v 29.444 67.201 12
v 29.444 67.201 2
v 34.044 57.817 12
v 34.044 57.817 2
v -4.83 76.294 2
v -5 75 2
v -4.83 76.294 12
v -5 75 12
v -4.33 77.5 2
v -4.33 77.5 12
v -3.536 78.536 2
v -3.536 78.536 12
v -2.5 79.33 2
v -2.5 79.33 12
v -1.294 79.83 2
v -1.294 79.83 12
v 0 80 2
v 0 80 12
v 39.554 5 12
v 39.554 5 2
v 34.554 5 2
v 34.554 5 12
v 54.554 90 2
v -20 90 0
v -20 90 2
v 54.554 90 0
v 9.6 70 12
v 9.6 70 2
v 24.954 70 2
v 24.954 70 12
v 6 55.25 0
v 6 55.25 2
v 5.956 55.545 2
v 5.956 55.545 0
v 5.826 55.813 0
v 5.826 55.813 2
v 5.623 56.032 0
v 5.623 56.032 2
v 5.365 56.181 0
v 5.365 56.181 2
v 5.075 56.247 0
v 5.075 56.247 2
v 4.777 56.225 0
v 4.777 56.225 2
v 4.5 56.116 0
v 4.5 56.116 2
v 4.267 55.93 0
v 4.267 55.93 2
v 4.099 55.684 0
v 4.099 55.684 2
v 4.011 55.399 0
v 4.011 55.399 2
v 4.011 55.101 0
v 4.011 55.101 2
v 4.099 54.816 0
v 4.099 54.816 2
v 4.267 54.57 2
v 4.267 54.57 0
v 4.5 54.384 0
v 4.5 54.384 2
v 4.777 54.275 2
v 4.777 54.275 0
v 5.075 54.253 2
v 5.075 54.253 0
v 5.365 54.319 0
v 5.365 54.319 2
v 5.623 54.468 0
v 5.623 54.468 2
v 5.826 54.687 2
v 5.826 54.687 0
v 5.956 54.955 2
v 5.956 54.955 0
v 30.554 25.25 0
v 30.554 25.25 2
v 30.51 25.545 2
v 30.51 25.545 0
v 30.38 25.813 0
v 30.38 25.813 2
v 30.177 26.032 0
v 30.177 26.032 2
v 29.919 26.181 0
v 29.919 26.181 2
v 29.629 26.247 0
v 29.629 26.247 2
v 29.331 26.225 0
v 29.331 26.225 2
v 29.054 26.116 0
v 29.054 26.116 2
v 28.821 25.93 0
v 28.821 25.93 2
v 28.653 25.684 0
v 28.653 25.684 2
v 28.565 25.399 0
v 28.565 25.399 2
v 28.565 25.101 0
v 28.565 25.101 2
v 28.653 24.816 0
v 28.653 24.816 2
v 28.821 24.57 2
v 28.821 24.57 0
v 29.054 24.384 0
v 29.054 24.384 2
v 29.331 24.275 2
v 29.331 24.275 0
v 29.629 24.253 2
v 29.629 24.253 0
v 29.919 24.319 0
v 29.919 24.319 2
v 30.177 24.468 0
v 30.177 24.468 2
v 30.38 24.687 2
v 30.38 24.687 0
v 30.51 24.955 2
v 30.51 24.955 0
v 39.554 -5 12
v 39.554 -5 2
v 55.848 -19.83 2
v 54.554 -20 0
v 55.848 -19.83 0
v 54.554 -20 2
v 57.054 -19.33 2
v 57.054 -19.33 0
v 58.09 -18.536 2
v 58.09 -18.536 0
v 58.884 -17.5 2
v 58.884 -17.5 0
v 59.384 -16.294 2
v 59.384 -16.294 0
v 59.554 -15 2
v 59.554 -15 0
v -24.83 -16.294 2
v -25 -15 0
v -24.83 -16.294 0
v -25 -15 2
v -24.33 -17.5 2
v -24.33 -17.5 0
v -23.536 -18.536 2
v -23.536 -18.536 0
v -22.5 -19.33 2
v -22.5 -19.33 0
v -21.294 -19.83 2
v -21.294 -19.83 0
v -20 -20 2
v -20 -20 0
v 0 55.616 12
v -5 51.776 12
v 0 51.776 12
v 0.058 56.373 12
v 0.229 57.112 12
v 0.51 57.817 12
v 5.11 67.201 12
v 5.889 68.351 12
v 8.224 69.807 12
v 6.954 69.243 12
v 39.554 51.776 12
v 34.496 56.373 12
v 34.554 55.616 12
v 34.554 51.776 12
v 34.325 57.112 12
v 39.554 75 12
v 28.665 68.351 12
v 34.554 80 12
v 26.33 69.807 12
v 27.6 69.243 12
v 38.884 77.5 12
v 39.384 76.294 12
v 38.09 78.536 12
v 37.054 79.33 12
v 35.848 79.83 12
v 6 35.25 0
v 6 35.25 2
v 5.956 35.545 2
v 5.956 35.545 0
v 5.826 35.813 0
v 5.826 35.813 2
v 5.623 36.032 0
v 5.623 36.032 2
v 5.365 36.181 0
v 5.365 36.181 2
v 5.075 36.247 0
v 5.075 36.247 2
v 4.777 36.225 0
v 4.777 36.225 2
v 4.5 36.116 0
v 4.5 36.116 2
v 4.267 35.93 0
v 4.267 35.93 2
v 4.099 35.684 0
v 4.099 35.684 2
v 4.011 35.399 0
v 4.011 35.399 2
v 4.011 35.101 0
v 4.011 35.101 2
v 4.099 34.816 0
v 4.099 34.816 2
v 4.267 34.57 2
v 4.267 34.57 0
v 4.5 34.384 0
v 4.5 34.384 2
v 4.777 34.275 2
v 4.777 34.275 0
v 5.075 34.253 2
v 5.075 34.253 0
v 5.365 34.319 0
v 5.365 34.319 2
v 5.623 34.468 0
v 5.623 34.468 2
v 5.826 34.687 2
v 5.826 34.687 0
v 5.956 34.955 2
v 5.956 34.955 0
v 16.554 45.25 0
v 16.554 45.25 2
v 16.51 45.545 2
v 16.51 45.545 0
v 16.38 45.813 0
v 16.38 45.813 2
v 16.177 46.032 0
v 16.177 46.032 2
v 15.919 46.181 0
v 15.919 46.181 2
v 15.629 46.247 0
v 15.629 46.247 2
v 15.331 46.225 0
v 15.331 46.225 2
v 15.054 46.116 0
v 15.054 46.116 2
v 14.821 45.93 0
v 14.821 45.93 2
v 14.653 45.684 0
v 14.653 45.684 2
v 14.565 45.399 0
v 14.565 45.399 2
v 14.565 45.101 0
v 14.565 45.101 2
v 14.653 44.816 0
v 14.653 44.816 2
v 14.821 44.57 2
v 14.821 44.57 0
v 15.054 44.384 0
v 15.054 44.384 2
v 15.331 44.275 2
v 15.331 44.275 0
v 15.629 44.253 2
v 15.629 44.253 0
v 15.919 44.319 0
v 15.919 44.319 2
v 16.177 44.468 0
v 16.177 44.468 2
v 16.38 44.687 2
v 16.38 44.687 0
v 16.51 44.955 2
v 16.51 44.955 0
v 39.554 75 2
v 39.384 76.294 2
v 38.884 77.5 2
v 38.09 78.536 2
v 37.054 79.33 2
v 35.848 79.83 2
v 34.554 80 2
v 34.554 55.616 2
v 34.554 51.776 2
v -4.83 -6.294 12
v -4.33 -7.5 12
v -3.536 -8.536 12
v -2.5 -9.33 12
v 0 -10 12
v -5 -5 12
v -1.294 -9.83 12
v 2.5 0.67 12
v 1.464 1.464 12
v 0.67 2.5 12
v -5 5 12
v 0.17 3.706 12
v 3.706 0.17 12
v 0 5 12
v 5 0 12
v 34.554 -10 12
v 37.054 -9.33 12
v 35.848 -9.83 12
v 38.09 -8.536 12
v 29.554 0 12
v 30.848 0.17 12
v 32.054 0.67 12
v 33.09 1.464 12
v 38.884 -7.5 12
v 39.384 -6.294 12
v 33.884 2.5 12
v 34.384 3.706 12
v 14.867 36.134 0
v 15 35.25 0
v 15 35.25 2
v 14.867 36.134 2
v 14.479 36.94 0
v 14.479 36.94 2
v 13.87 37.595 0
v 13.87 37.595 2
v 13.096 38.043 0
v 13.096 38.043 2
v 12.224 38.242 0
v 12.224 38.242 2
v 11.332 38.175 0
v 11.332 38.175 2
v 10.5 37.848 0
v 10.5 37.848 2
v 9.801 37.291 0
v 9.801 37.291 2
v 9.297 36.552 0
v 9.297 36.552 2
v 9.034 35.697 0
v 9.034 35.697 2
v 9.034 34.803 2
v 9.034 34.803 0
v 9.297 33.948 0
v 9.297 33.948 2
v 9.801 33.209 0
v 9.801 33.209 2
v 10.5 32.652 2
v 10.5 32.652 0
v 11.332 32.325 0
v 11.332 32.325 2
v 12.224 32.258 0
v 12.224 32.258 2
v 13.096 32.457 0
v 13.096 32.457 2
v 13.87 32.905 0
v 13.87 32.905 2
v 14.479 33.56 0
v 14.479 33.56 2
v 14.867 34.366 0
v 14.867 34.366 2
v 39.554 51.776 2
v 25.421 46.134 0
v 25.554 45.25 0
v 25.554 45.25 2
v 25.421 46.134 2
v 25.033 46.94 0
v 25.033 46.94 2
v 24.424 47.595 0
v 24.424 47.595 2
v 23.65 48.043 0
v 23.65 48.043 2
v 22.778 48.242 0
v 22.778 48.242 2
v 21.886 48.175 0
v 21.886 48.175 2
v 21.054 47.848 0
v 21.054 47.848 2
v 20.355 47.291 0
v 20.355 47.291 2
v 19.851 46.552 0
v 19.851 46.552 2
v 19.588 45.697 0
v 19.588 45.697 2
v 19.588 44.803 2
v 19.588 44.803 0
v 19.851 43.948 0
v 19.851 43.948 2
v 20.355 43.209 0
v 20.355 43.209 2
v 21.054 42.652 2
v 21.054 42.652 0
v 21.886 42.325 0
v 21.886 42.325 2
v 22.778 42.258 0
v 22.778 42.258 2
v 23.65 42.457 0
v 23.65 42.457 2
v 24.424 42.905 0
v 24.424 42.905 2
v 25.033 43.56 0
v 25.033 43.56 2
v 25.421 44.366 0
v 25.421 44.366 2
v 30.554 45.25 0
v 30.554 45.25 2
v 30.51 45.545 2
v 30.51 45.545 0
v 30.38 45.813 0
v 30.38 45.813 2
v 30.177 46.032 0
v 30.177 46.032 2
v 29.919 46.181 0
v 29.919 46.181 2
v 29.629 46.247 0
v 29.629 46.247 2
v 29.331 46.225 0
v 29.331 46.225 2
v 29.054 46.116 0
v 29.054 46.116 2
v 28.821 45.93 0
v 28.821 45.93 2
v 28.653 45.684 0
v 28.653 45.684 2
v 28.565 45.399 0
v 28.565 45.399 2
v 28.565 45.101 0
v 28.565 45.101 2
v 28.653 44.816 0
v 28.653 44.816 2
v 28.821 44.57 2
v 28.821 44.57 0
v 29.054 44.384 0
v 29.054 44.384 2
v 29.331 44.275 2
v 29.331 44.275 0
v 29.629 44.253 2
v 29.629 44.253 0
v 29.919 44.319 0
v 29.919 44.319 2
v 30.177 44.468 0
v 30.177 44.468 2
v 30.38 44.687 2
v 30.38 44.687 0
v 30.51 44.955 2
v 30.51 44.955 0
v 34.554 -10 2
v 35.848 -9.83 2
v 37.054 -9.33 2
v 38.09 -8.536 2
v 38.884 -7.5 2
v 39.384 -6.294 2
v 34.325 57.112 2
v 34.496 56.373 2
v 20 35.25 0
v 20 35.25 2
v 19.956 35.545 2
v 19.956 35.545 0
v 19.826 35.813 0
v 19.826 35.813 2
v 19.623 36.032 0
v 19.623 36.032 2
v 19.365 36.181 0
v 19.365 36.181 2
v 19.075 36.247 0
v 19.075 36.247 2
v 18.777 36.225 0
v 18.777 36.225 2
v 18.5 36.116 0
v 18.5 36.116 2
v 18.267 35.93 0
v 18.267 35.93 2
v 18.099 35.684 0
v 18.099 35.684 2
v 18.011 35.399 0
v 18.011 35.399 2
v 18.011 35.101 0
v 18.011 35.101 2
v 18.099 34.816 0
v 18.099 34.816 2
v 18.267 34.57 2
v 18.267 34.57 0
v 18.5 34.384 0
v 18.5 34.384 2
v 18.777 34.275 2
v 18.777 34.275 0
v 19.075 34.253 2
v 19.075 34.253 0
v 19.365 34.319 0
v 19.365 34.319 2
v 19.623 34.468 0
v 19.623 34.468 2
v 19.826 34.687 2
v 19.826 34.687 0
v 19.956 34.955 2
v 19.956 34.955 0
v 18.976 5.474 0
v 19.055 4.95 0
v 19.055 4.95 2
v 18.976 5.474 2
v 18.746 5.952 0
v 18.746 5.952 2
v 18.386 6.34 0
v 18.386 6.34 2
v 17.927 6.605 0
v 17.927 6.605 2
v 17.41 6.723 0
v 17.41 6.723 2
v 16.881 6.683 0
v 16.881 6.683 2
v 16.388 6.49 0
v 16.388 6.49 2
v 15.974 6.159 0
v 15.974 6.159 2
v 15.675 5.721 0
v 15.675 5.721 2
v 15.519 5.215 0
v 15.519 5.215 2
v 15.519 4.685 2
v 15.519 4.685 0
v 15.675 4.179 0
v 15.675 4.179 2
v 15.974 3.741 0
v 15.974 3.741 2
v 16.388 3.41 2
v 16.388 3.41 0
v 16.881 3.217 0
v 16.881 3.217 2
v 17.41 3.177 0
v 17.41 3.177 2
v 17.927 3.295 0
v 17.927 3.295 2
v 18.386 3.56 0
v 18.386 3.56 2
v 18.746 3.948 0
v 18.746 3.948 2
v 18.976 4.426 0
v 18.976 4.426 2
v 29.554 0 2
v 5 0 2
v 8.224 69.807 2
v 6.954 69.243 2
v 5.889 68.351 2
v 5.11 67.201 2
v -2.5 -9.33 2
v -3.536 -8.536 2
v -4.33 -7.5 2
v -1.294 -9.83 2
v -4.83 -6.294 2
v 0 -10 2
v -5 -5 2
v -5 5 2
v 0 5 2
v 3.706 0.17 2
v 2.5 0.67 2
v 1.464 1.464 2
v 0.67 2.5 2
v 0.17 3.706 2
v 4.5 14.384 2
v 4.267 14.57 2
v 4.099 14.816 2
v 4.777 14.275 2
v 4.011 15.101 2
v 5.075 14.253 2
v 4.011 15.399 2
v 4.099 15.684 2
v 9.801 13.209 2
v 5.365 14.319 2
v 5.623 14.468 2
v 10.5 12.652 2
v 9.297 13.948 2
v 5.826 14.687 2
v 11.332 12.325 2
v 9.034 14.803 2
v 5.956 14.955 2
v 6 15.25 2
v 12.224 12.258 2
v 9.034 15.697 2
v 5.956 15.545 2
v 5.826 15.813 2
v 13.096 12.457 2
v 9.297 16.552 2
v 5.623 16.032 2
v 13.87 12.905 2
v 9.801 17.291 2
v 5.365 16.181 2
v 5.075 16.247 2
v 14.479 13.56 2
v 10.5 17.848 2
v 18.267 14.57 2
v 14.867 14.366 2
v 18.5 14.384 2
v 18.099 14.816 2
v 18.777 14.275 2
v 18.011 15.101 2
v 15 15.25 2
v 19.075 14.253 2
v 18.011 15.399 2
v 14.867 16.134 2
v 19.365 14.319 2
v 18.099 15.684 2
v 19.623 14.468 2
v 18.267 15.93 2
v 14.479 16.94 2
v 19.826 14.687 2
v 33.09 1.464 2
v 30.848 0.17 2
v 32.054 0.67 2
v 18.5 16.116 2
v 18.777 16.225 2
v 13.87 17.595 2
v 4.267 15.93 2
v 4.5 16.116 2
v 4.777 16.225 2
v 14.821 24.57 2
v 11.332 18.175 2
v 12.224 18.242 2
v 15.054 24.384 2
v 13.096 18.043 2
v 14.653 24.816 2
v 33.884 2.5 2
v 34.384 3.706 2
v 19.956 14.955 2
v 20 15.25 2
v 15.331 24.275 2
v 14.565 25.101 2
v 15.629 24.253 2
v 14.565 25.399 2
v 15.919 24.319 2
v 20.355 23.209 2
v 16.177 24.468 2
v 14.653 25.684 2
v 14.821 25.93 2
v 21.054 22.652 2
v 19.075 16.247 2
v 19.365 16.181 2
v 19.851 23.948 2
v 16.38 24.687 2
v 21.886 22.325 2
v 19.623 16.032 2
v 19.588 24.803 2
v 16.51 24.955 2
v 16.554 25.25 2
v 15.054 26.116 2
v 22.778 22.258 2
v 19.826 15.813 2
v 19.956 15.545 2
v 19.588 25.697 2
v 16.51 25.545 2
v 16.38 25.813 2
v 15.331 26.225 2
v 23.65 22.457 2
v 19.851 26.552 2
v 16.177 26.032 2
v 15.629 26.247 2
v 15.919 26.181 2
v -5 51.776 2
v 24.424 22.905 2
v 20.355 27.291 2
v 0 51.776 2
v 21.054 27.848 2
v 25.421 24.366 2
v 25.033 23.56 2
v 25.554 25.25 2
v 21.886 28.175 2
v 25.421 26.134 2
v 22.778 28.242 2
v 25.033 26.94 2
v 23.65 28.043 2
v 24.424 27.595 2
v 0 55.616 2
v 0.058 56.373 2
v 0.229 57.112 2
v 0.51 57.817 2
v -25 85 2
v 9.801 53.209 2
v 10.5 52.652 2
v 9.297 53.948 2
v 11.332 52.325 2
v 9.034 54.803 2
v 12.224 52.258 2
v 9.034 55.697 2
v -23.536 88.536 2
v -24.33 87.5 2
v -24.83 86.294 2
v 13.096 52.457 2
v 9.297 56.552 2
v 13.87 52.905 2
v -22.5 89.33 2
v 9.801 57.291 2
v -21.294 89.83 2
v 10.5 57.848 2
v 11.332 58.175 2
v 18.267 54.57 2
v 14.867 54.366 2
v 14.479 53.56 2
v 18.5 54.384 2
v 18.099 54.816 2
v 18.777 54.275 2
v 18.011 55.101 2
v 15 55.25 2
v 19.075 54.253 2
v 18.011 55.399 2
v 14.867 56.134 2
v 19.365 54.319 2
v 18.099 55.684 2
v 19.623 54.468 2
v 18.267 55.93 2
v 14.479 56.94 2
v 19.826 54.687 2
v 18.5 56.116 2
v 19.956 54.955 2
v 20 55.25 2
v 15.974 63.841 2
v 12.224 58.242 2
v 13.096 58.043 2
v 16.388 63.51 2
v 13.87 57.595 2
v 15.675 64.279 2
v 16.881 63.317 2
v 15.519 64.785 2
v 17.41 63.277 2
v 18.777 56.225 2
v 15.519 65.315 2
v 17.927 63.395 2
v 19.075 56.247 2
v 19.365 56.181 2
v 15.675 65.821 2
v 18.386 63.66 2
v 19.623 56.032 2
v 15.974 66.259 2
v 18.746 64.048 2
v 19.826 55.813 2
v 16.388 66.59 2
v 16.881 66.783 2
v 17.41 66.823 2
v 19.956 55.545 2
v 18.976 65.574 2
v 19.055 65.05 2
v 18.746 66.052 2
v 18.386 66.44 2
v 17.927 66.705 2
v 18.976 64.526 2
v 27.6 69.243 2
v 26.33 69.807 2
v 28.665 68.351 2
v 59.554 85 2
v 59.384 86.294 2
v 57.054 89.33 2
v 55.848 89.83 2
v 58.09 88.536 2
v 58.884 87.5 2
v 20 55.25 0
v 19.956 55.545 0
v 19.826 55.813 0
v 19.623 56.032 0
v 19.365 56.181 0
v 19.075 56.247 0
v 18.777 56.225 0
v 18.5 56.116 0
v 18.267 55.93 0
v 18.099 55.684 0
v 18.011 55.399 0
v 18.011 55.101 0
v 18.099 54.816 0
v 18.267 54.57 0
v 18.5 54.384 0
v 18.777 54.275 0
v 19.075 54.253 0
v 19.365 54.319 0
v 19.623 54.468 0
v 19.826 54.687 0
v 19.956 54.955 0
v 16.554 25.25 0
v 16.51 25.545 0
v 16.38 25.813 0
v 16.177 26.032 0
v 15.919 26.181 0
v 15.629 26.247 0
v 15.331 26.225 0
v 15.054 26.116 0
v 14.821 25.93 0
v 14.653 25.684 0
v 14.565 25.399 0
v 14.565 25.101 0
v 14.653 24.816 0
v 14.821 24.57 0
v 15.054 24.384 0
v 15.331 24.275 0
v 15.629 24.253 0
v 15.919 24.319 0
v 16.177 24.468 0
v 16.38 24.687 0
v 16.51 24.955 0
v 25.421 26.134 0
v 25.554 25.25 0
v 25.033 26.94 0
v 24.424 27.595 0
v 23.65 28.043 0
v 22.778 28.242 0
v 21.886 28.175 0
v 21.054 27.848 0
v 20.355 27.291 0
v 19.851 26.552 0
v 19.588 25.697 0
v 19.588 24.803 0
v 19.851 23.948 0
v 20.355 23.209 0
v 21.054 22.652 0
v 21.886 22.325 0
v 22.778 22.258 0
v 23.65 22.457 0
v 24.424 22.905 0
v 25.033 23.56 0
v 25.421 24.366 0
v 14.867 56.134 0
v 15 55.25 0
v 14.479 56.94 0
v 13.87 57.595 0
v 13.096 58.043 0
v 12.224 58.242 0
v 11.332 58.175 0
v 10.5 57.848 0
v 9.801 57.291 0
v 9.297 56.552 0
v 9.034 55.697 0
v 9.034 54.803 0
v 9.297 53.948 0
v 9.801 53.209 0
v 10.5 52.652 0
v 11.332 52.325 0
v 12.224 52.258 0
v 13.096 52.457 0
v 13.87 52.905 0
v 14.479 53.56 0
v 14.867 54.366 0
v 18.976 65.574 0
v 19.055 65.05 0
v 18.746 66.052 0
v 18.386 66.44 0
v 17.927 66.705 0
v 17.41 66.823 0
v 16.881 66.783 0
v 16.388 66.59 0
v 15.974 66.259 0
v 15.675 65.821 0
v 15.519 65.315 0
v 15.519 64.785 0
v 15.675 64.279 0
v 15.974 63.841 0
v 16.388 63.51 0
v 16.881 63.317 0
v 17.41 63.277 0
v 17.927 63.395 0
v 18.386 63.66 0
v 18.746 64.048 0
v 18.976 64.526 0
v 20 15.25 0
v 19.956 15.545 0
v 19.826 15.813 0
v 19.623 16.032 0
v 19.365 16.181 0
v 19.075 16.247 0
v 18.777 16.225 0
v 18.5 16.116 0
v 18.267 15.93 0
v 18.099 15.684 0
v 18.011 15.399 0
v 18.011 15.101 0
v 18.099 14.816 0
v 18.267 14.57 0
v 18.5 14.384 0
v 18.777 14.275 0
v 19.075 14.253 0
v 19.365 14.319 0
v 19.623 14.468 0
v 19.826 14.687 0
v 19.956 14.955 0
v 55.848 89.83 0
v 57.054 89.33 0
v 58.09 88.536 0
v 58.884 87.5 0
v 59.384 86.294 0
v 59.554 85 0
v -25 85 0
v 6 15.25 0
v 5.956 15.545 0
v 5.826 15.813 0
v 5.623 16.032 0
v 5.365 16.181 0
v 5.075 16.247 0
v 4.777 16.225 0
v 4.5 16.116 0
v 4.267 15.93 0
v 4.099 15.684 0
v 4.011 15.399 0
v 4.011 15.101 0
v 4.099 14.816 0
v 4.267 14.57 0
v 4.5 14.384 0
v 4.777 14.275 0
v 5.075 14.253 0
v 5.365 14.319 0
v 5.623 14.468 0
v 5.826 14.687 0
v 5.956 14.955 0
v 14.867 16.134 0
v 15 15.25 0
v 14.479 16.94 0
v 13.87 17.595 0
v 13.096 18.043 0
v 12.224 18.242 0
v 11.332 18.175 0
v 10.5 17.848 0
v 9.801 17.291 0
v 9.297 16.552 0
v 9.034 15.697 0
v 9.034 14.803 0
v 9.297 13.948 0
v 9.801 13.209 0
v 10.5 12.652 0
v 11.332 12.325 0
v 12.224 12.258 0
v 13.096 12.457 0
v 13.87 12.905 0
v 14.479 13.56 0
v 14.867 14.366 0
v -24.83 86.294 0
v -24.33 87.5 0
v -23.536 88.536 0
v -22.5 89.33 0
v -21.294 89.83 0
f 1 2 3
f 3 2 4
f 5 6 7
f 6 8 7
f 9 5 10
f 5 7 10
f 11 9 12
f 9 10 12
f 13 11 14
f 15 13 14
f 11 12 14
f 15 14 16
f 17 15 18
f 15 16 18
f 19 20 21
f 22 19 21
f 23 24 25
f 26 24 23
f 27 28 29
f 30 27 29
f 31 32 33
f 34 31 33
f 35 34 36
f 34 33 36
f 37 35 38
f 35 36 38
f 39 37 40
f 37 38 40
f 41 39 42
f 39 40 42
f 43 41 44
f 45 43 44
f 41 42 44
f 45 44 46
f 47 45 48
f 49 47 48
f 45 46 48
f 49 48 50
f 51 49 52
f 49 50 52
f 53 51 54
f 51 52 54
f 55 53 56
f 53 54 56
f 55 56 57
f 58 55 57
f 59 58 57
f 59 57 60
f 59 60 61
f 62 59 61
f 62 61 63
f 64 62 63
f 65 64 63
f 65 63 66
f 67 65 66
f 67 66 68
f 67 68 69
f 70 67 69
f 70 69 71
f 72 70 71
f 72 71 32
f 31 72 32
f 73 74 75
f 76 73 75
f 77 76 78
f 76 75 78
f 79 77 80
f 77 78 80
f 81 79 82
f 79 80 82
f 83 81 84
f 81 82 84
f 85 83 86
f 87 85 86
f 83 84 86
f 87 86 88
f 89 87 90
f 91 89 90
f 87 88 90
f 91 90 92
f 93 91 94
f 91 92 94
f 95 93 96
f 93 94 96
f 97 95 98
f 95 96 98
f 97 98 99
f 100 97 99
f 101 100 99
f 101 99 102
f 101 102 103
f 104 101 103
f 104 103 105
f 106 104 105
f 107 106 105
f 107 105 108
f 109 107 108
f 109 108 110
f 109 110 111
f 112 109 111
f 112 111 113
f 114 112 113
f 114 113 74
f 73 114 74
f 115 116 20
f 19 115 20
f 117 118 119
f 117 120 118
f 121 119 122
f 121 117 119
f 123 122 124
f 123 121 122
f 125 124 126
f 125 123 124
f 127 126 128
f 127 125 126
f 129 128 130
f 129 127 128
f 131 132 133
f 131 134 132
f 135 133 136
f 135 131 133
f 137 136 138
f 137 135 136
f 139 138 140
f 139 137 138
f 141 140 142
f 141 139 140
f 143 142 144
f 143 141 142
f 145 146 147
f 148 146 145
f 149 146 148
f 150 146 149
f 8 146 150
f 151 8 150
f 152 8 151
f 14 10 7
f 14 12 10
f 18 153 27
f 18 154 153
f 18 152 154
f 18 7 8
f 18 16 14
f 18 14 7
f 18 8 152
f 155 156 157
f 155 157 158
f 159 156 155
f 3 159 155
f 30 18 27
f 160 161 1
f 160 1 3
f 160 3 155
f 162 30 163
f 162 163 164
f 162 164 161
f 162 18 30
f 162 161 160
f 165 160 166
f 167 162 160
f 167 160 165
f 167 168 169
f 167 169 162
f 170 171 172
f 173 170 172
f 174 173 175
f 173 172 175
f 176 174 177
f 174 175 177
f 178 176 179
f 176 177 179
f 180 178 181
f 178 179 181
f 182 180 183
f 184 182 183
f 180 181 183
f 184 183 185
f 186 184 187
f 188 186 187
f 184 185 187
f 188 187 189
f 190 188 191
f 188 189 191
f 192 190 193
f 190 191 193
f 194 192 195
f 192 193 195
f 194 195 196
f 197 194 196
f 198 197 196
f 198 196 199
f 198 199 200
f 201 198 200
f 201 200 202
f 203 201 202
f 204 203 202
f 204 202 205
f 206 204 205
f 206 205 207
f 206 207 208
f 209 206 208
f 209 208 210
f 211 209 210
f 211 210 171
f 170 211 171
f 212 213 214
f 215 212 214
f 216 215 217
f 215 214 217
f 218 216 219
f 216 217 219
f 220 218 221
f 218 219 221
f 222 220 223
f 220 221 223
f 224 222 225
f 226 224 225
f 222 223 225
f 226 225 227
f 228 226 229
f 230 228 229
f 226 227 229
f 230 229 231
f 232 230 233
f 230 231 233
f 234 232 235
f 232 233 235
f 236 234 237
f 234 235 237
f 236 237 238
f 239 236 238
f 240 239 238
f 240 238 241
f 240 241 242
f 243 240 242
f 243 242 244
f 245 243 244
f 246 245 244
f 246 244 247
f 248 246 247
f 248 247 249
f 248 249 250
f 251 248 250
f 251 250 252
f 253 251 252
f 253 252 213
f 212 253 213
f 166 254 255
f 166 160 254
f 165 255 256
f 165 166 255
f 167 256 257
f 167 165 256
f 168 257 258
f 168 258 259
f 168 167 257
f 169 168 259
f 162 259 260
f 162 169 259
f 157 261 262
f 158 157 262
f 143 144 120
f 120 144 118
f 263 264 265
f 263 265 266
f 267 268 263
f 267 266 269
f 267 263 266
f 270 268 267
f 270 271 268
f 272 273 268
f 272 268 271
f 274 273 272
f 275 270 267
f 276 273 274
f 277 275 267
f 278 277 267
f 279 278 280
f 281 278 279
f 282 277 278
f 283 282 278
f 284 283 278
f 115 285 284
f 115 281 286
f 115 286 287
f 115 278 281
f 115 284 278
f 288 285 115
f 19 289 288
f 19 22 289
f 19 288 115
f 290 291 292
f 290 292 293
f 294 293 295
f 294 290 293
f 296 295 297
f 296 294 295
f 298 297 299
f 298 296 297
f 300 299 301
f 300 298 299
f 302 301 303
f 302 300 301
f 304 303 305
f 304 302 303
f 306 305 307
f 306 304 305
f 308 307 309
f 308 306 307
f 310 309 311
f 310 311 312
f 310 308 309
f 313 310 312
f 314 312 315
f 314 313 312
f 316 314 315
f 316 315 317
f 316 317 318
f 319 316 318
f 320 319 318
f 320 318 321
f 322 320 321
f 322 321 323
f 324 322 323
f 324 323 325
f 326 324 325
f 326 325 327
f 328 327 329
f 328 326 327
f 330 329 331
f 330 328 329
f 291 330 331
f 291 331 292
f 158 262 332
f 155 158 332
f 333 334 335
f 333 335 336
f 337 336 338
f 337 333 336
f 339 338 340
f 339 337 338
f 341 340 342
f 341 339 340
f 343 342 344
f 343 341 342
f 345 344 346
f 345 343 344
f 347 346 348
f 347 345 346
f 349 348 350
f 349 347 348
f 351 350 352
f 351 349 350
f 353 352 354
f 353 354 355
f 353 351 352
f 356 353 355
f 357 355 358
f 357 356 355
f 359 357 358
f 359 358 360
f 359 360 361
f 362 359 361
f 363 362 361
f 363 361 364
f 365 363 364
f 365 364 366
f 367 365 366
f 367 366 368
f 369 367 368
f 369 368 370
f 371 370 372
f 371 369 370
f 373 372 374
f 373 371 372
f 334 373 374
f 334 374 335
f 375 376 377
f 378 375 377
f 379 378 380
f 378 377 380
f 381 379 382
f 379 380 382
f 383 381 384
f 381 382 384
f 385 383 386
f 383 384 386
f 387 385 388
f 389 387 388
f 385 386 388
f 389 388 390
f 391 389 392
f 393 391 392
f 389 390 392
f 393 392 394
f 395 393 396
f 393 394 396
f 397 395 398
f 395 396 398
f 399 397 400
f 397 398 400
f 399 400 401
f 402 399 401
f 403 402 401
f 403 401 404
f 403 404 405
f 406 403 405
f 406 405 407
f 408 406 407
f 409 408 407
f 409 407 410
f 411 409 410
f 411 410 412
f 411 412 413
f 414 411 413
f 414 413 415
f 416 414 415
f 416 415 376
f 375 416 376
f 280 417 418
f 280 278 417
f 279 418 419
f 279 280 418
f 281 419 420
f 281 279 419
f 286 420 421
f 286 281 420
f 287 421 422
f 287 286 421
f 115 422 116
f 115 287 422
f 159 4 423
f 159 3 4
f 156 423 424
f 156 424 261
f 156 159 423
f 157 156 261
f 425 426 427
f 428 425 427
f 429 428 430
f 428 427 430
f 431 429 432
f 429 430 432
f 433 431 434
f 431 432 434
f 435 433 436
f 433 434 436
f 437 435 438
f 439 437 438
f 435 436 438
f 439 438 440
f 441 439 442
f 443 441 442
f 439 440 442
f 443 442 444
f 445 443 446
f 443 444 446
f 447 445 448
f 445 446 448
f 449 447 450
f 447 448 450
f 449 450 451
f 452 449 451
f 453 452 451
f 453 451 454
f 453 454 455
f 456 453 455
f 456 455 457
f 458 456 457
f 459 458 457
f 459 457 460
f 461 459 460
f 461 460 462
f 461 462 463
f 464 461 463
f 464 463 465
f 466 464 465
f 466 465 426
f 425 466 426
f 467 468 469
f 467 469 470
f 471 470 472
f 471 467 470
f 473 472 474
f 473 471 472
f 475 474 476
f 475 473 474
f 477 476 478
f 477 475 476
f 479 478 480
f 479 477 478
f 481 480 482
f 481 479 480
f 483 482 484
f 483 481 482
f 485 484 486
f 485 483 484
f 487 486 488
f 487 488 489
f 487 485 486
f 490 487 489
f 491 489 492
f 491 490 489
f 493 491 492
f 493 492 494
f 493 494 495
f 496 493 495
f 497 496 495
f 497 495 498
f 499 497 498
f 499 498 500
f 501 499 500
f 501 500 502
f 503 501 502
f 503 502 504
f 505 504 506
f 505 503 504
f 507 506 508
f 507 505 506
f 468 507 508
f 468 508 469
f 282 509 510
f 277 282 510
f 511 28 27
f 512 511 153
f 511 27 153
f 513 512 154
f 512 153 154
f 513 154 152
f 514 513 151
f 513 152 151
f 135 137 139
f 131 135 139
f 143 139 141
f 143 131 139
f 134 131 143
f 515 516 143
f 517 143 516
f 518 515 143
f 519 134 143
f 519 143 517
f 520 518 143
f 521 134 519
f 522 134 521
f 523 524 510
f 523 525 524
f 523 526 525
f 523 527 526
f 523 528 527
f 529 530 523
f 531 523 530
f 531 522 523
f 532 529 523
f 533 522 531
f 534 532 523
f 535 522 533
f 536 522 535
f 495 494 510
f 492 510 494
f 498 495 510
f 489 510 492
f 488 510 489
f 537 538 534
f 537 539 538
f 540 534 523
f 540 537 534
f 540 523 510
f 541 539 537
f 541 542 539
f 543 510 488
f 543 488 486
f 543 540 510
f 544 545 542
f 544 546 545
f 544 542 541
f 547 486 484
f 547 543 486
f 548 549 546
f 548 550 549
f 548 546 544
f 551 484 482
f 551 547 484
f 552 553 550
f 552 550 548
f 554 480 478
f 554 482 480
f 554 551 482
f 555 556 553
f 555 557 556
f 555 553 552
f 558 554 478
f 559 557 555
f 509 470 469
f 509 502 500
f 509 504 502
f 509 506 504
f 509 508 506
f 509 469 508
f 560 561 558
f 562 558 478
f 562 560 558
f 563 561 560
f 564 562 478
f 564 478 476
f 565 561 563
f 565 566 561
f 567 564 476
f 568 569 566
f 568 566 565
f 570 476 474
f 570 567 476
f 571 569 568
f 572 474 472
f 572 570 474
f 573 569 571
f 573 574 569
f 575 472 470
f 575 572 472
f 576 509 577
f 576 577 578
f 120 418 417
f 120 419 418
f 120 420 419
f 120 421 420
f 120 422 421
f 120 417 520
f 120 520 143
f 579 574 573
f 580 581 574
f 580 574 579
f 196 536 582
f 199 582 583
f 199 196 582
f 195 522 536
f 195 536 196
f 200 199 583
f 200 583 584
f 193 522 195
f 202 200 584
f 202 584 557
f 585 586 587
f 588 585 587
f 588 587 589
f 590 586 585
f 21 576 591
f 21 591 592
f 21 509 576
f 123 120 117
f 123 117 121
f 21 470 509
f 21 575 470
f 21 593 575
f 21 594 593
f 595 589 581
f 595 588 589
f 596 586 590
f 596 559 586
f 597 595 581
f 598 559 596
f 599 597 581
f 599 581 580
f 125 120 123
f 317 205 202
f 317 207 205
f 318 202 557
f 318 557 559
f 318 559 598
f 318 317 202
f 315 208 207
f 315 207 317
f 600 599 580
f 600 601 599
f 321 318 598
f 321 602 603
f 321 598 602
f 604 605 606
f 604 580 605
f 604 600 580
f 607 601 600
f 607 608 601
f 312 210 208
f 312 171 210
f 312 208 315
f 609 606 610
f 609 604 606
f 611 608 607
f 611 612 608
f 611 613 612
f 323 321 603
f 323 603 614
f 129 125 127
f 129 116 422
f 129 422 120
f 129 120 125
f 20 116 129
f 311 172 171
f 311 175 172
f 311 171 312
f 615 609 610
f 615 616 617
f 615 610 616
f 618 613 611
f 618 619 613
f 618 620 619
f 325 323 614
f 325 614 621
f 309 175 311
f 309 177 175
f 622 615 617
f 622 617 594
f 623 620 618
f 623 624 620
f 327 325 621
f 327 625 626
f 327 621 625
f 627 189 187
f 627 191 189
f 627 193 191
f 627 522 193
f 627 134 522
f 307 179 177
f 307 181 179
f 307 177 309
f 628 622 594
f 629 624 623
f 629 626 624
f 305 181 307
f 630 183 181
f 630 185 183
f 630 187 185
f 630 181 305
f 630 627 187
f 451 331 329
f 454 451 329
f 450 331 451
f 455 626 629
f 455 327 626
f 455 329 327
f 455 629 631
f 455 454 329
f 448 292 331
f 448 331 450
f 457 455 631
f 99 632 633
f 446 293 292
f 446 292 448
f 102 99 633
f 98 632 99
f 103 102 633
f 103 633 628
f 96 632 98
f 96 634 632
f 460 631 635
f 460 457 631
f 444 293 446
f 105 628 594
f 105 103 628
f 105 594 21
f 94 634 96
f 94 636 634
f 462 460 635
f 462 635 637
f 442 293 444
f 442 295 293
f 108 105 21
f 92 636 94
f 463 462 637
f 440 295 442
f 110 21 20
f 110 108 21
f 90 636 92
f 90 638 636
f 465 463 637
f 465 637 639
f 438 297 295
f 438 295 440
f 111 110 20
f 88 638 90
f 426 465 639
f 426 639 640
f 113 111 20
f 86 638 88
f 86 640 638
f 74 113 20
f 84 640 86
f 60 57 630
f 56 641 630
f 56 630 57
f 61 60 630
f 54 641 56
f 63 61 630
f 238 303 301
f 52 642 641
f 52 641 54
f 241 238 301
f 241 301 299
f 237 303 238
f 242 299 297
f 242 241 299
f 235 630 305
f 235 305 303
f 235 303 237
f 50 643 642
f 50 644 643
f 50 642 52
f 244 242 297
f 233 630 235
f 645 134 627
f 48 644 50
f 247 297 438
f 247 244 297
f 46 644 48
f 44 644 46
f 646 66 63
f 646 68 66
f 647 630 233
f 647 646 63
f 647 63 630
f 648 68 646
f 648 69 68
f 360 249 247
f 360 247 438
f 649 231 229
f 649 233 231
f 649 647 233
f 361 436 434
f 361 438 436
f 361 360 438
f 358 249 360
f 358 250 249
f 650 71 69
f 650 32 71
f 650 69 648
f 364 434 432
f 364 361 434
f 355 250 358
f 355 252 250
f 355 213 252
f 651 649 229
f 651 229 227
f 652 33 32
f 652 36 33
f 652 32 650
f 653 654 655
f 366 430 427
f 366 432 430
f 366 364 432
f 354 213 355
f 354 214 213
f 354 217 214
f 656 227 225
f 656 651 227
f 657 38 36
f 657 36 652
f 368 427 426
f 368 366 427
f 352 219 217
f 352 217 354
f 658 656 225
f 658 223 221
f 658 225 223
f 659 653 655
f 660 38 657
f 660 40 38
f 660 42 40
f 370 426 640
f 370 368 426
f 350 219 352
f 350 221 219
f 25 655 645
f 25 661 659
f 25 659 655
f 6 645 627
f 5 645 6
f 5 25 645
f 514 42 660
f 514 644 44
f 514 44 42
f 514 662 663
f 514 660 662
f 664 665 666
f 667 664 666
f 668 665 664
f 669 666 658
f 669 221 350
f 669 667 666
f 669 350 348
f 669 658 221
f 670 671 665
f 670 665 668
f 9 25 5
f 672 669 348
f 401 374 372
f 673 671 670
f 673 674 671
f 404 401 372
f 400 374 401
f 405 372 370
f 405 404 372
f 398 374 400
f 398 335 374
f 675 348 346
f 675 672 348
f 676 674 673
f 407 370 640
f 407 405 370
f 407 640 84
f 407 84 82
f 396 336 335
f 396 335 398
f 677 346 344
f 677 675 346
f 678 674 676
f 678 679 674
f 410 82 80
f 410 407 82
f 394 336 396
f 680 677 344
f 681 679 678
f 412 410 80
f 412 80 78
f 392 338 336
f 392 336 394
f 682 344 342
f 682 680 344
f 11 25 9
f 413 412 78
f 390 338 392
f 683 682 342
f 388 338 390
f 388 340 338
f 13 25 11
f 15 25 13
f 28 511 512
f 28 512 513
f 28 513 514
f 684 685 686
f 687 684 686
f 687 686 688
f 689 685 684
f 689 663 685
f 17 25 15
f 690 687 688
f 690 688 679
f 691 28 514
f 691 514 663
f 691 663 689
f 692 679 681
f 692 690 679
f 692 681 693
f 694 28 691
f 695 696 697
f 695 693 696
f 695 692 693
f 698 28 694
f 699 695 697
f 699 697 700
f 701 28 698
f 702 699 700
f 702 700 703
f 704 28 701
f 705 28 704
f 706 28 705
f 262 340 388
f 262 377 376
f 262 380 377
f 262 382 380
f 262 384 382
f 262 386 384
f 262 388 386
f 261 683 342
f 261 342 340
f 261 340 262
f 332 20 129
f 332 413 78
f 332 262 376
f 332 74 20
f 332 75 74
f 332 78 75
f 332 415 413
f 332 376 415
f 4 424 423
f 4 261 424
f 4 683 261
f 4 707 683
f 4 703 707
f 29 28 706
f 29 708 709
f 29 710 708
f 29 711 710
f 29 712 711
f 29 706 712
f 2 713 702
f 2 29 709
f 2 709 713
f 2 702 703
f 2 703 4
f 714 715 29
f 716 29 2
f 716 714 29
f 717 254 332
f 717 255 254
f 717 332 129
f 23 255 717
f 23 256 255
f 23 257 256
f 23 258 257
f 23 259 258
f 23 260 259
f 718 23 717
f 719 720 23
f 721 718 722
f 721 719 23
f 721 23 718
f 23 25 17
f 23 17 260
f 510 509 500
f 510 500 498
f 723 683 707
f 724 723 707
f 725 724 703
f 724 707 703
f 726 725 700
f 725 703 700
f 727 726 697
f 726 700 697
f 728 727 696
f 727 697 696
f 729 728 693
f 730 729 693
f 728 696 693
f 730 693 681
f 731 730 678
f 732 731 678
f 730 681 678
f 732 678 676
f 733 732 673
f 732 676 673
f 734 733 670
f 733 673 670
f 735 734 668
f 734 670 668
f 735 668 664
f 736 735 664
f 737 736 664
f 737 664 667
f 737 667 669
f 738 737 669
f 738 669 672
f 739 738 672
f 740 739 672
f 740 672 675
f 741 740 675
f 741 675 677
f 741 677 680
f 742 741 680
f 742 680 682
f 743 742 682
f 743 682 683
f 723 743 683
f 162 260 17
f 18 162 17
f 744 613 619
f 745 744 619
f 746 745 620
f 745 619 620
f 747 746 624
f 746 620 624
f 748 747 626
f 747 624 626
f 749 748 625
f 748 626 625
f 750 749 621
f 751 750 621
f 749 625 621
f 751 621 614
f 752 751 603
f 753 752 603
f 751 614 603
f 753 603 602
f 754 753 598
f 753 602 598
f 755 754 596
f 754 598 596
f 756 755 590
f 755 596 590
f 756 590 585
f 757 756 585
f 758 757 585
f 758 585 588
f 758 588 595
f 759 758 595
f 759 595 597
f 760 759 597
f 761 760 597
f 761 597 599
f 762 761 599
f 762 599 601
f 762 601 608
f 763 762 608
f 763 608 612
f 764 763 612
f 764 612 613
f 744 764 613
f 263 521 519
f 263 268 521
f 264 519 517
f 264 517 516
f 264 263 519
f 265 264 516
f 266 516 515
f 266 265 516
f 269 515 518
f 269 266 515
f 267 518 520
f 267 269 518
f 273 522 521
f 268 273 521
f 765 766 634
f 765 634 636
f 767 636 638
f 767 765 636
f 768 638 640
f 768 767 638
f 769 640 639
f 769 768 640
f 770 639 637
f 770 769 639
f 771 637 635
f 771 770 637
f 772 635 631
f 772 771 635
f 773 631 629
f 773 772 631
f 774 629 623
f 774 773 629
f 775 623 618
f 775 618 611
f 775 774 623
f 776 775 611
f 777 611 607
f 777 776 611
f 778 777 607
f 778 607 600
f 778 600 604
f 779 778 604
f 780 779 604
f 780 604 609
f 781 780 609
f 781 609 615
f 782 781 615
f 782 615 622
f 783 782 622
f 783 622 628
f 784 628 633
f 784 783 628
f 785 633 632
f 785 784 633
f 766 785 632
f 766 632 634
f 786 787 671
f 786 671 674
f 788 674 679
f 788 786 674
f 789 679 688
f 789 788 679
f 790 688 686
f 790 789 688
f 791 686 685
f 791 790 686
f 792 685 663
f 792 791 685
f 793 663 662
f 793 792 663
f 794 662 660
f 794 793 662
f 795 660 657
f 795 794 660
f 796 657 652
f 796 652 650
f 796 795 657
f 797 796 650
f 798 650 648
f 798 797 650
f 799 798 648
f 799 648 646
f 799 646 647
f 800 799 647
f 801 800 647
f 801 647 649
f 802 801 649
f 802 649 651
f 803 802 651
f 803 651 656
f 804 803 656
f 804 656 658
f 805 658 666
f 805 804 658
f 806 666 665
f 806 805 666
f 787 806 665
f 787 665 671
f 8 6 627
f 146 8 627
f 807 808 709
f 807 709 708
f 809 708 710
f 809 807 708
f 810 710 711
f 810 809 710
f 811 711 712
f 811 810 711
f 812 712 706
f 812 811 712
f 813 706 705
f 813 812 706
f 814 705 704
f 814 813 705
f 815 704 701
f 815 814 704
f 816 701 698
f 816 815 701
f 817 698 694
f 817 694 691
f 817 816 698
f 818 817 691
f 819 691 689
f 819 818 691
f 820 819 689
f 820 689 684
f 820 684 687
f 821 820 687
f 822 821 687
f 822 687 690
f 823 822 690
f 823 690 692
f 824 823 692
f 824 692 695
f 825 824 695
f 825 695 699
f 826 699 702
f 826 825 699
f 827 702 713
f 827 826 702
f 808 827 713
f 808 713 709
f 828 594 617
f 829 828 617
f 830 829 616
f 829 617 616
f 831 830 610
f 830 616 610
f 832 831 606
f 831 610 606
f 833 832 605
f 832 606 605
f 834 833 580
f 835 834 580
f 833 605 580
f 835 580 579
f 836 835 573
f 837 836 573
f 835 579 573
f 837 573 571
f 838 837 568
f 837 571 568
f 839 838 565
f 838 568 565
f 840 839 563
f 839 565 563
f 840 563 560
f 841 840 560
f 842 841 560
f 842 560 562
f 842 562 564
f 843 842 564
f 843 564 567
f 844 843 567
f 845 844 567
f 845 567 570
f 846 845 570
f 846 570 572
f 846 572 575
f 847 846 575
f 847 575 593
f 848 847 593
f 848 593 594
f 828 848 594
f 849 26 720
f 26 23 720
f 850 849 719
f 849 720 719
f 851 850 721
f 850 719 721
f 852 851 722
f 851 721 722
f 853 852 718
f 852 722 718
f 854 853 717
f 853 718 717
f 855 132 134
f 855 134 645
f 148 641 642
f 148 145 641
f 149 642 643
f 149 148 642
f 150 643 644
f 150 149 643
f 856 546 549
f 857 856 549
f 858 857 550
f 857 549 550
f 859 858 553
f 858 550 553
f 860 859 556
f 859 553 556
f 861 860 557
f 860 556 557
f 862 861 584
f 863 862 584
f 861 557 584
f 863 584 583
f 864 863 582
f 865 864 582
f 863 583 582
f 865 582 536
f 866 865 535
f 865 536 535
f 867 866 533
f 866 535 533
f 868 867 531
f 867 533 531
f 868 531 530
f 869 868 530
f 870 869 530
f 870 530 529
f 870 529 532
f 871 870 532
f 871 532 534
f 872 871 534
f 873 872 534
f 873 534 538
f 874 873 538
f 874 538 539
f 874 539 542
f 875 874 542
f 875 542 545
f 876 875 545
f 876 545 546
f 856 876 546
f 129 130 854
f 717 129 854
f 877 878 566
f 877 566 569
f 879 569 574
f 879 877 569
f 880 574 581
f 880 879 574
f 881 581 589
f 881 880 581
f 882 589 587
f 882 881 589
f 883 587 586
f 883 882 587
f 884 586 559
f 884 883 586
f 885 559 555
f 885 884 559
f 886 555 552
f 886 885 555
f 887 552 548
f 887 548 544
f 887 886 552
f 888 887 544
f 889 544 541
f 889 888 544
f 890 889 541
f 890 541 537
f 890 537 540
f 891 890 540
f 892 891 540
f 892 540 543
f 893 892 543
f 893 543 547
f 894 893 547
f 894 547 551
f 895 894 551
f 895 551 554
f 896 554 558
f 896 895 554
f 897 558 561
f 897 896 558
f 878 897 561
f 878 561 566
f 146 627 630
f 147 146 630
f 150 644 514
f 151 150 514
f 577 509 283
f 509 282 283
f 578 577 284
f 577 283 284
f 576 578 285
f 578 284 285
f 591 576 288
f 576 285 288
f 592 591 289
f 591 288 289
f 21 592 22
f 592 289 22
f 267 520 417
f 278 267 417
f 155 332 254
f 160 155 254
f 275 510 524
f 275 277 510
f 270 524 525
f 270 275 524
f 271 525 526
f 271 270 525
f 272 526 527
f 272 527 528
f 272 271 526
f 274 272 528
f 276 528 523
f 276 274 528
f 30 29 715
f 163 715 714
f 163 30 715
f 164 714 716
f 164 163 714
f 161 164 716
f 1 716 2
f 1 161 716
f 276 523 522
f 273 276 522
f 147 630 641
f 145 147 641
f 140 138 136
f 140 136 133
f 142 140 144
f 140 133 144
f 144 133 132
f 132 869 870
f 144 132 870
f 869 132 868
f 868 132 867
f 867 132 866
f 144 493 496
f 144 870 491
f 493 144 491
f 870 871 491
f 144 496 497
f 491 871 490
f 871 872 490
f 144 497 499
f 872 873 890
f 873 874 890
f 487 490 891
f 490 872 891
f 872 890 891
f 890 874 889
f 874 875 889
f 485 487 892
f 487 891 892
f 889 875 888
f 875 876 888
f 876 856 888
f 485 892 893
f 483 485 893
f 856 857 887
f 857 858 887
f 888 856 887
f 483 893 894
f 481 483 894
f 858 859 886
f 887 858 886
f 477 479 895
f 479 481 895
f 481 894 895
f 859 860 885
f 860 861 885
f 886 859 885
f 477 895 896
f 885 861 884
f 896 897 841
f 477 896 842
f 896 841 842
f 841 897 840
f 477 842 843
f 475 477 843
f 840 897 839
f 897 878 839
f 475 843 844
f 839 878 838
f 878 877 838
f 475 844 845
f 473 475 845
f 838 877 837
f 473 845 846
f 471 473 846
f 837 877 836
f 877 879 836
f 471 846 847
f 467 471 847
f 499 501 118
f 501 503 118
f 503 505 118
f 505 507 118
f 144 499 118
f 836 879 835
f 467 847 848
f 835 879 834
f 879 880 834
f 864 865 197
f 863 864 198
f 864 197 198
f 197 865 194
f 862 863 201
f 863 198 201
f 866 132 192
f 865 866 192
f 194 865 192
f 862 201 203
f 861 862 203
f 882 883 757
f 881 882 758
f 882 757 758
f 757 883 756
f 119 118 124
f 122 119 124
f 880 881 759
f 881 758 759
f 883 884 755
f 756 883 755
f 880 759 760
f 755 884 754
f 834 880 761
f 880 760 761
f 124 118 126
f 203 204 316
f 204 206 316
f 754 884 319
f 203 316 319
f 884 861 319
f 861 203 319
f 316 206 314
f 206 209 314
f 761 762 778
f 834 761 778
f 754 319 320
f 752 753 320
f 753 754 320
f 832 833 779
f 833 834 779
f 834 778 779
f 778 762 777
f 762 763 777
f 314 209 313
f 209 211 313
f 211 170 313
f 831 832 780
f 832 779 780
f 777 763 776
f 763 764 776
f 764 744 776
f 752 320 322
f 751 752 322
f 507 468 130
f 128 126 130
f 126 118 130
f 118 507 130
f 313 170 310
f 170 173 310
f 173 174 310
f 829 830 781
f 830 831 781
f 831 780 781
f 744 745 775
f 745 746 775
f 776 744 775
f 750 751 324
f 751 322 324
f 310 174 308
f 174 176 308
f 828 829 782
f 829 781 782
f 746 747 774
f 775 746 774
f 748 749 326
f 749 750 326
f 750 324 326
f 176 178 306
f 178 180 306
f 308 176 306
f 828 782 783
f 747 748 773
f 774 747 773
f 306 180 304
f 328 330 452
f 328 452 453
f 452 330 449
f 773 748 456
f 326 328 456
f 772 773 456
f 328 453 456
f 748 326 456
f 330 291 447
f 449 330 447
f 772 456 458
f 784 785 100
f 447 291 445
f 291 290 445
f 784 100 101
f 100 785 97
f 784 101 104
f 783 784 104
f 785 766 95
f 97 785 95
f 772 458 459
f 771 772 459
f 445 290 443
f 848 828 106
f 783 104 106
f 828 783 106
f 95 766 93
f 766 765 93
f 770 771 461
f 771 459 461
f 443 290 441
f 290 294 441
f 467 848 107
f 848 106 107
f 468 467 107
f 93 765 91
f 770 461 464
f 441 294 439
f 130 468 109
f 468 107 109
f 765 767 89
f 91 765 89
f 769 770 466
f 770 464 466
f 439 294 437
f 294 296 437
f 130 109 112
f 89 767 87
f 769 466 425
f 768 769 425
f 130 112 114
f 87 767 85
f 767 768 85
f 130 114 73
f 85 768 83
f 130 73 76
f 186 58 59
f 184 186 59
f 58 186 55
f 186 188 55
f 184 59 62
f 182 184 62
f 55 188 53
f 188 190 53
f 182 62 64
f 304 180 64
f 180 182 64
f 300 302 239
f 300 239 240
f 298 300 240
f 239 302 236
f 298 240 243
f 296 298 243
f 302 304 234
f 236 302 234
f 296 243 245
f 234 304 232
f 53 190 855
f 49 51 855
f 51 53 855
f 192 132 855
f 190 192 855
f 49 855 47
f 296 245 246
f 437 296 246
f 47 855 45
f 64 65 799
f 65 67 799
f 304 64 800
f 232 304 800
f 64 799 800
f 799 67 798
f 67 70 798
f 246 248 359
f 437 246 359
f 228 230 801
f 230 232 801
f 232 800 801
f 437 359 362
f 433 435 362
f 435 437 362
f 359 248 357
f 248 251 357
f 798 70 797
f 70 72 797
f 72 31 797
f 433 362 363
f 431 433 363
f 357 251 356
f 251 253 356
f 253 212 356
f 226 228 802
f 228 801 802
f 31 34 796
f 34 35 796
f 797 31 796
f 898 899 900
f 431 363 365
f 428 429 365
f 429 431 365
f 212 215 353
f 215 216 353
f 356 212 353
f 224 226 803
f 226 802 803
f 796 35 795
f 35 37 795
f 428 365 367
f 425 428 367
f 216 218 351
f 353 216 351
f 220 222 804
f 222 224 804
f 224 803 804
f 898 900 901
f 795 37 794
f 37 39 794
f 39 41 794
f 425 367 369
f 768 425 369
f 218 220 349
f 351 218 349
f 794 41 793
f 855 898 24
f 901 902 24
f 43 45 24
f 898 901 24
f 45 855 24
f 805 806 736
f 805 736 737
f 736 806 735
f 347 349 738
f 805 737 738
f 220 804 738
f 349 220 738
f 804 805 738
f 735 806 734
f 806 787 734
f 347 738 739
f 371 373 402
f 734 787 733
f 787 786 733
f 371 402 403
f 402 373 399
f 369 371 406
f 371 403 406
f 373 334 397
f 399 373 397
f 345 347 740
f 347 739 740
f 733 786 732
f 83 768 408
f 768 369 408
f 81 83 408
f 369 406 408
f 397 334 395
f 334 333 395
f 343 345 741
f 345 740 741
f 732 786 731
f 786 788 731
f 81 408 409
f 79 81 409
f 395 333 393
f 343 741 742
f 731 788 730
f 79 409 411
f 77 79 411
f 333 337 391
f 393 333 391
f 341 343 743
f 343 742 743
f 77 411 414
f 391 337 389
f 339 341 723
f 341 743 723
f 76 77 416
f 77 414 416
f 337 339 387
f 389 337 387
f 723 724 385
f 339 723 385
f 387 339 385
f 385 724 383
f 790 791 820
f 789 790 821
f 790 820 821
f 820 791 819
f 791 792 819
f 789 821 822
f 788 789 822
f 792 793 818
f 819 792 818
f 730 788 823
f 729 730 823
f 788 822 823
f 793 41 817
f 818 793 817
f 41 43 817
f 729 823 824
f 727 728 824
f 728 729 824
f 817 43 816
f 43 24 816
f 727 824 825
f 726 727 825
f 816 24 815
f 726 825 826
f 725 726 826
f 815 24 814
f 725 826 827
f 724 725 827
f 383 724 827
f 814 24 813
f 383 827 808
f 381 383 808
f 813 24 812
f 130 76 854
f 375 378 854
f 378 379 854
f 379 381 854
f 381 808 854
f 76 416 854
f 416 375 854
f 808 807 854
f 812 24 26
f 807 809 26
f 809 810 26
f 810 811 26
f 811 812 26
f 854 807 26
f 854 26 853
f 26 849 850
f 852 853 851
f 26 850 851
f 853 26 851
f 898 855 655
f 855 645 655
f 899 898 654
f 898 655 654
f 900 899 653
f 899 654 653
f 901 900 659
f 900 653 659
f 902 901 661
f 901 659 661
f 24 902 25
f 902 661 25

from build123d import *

# Parameters (mm, degrees)
F0_W     = 84.554
F0_H     = 110
F0_R     = 3
F0_R_2   = 1.778
F1_DEPTH = 2
F2_DEPTH = 12
F3_DEPTH = 12
F4_R     = 4.99999
F5_R     = 5
F6_R     = 1
F7_DEPTH = 25
F8_DEPTH = 25


# Not quite as in the source:
# - a fillet or chamfer is up to 0.001 mm smaller than in the source, because OpenCascade refuses the exact size
# - a feature names something its author has since deleted; it is built from what else it names


with BuildPart() as f1:
    # F0 (on Top) → F1 (new body)
    with BuildSketch(Plane.XY):
        with Locations((17.277, 35)):
            Rectangle(F0_W, F0_H)
        with Locations((12, 15.25)):
            Circle(F0_R, mode=Mode.SUBTRACT)
        Polygon((0, 5), (0, 0), (34.554, 0), (34.554, 5), (39.554, 5), (39.554, -10), (-5, -10), (-5, 5), align=None, mode=Mode.SUBTRACT)
        with Locations((17.277, 4.95)):
            Circle(F0_R_2, mode=Mode.SUBTRACT)
        with Locations((22.554, 25.25)):
            Circle(F0_R, mode=Mode.SUBTRACT)
        with Locations((12, 35.25)):
            Circle(F0_R, mode=Mode.SUBTRACT)
        with Locations((12, 55.25)):
            Circle(F0_R, mode=Mode.SUBTRACT)
        with Locations((22.554, 45.25)):
            Circle(F0_R, mode=Mode.SUBTRACT)
        with Locations((17.277, 65.05)):
            Circle(F0_R_2, mode=Mode.SUBTRACT)
        Polygon((6.482, 70), (0, 56.776), (0, 51.776), (-5, 51.776), (-5, 80), (39.554, 80), (39.554, 51.776), (34.554, 51.776), (34.554, 56.776), (28.072, 70), align=None, mode=Mode.SUBTRACT)
    extrude(amount=F1_DEPTH)

    # F0 (on Top) → F2 (join)
    with BuildSketch(Plane.XY):
        Polygon((0, 51.776), (0, 56.776), (6.482, 70), (28.072, 70), (34.554, 56.776), (34.554, 51.776), (39.554, 51.776), (39.554, 80), (-5, 80), (-5, 51.776), align=None)
    extrude(amount=F2_DEPTH)

    # F0 (on Top) → F3 (join)
    with BuildSketch(Plane.XY):
        Polygon((34.554, 0), (0, 0), (0, 5), (-5, 5), (-5, -10), (39.554, -10), (39.554, 5), (34.554, 5), align=None)
    extrude(amount=F3_DEPTH)

    # F4 (radius 5 in the source; OpenCascade refuses exactly that, so slightly less here)
    f4_edges = [f1.edges().sort_by_distance(p)[0] for p in [
        (6.482, 70, 7),
        (28.072, 70, 7),
        (0, 56.776, 7),
        (34.554, 56.776, 7),
        (34.554, 0, 7),
        (0, 0, 7),
        (59.554, -20, 1),
        (59.554, 90, 1),
        (-25, 90, 1),
        (-25, -20, 1),
    ]]
    fillet(f4_edges, radius=F4_R)

    # F5
    f5_edges = [f1.edges().sort_by_distance(p)[0] for p in [
        (-5, -10, 7),
        (39.554, -10, 7),
        (39.554, 80, 7),
        (-5, 80, 7),
    ]]
    fillet(f5_edges, radius=F5_R)

    # F6 (on face) → F7 (cut)
    with BuildSketch(Plane.XY.offset(2)):
        with Locations((5, 55.25)):
            Circle(F6_R)
        with Locations((19, 55.25)):
            Circle(F6_R)
        with Locations((19, 35.25)):
            Circle(F6_R)
        with Locations((5, 35.25)):
            Circle(F6_R)
        with Locations((15.554, 25.25)):
            Circle(F6_R)
        with Locations((29.554, 25.25)):
            Circle(F6_R)
    extrude(amount=-F7_DEPTH, mode=Mode.SUBTRACT)

    # F6 (on face) → F8 (cut)
    with BuildSketch(Plane.XY.offset(2)):
        with Locations((5, 55.25)):
            Circle(F6_R)
        with Locations((19, 55.25)):
            Circle(F6_R)
        with Locations((19, 35.25)):
            Circle(F6_R)
        with Locations((5, 35.25)):
            Circle(F6_R)
        with Locations((15.554, 25.25)):
            Circle(F6_R)
        with Locations((29.554, 25.25)):
            Circle(F6_R)
        with Locations((15.554, 45.25)):
            Circle(F6_R)
        with Locations((29.554, 45.25)):
            Circle(F6_R)
        with Locations((5, 15.25)):
            Circle(F6_R)
        with Locations((19, 15.25)):
            Circle(F6_R)
    extrude(amount=-F8_DEPTH, mode=Mode.SUBTRACT)


solid = f1.part
